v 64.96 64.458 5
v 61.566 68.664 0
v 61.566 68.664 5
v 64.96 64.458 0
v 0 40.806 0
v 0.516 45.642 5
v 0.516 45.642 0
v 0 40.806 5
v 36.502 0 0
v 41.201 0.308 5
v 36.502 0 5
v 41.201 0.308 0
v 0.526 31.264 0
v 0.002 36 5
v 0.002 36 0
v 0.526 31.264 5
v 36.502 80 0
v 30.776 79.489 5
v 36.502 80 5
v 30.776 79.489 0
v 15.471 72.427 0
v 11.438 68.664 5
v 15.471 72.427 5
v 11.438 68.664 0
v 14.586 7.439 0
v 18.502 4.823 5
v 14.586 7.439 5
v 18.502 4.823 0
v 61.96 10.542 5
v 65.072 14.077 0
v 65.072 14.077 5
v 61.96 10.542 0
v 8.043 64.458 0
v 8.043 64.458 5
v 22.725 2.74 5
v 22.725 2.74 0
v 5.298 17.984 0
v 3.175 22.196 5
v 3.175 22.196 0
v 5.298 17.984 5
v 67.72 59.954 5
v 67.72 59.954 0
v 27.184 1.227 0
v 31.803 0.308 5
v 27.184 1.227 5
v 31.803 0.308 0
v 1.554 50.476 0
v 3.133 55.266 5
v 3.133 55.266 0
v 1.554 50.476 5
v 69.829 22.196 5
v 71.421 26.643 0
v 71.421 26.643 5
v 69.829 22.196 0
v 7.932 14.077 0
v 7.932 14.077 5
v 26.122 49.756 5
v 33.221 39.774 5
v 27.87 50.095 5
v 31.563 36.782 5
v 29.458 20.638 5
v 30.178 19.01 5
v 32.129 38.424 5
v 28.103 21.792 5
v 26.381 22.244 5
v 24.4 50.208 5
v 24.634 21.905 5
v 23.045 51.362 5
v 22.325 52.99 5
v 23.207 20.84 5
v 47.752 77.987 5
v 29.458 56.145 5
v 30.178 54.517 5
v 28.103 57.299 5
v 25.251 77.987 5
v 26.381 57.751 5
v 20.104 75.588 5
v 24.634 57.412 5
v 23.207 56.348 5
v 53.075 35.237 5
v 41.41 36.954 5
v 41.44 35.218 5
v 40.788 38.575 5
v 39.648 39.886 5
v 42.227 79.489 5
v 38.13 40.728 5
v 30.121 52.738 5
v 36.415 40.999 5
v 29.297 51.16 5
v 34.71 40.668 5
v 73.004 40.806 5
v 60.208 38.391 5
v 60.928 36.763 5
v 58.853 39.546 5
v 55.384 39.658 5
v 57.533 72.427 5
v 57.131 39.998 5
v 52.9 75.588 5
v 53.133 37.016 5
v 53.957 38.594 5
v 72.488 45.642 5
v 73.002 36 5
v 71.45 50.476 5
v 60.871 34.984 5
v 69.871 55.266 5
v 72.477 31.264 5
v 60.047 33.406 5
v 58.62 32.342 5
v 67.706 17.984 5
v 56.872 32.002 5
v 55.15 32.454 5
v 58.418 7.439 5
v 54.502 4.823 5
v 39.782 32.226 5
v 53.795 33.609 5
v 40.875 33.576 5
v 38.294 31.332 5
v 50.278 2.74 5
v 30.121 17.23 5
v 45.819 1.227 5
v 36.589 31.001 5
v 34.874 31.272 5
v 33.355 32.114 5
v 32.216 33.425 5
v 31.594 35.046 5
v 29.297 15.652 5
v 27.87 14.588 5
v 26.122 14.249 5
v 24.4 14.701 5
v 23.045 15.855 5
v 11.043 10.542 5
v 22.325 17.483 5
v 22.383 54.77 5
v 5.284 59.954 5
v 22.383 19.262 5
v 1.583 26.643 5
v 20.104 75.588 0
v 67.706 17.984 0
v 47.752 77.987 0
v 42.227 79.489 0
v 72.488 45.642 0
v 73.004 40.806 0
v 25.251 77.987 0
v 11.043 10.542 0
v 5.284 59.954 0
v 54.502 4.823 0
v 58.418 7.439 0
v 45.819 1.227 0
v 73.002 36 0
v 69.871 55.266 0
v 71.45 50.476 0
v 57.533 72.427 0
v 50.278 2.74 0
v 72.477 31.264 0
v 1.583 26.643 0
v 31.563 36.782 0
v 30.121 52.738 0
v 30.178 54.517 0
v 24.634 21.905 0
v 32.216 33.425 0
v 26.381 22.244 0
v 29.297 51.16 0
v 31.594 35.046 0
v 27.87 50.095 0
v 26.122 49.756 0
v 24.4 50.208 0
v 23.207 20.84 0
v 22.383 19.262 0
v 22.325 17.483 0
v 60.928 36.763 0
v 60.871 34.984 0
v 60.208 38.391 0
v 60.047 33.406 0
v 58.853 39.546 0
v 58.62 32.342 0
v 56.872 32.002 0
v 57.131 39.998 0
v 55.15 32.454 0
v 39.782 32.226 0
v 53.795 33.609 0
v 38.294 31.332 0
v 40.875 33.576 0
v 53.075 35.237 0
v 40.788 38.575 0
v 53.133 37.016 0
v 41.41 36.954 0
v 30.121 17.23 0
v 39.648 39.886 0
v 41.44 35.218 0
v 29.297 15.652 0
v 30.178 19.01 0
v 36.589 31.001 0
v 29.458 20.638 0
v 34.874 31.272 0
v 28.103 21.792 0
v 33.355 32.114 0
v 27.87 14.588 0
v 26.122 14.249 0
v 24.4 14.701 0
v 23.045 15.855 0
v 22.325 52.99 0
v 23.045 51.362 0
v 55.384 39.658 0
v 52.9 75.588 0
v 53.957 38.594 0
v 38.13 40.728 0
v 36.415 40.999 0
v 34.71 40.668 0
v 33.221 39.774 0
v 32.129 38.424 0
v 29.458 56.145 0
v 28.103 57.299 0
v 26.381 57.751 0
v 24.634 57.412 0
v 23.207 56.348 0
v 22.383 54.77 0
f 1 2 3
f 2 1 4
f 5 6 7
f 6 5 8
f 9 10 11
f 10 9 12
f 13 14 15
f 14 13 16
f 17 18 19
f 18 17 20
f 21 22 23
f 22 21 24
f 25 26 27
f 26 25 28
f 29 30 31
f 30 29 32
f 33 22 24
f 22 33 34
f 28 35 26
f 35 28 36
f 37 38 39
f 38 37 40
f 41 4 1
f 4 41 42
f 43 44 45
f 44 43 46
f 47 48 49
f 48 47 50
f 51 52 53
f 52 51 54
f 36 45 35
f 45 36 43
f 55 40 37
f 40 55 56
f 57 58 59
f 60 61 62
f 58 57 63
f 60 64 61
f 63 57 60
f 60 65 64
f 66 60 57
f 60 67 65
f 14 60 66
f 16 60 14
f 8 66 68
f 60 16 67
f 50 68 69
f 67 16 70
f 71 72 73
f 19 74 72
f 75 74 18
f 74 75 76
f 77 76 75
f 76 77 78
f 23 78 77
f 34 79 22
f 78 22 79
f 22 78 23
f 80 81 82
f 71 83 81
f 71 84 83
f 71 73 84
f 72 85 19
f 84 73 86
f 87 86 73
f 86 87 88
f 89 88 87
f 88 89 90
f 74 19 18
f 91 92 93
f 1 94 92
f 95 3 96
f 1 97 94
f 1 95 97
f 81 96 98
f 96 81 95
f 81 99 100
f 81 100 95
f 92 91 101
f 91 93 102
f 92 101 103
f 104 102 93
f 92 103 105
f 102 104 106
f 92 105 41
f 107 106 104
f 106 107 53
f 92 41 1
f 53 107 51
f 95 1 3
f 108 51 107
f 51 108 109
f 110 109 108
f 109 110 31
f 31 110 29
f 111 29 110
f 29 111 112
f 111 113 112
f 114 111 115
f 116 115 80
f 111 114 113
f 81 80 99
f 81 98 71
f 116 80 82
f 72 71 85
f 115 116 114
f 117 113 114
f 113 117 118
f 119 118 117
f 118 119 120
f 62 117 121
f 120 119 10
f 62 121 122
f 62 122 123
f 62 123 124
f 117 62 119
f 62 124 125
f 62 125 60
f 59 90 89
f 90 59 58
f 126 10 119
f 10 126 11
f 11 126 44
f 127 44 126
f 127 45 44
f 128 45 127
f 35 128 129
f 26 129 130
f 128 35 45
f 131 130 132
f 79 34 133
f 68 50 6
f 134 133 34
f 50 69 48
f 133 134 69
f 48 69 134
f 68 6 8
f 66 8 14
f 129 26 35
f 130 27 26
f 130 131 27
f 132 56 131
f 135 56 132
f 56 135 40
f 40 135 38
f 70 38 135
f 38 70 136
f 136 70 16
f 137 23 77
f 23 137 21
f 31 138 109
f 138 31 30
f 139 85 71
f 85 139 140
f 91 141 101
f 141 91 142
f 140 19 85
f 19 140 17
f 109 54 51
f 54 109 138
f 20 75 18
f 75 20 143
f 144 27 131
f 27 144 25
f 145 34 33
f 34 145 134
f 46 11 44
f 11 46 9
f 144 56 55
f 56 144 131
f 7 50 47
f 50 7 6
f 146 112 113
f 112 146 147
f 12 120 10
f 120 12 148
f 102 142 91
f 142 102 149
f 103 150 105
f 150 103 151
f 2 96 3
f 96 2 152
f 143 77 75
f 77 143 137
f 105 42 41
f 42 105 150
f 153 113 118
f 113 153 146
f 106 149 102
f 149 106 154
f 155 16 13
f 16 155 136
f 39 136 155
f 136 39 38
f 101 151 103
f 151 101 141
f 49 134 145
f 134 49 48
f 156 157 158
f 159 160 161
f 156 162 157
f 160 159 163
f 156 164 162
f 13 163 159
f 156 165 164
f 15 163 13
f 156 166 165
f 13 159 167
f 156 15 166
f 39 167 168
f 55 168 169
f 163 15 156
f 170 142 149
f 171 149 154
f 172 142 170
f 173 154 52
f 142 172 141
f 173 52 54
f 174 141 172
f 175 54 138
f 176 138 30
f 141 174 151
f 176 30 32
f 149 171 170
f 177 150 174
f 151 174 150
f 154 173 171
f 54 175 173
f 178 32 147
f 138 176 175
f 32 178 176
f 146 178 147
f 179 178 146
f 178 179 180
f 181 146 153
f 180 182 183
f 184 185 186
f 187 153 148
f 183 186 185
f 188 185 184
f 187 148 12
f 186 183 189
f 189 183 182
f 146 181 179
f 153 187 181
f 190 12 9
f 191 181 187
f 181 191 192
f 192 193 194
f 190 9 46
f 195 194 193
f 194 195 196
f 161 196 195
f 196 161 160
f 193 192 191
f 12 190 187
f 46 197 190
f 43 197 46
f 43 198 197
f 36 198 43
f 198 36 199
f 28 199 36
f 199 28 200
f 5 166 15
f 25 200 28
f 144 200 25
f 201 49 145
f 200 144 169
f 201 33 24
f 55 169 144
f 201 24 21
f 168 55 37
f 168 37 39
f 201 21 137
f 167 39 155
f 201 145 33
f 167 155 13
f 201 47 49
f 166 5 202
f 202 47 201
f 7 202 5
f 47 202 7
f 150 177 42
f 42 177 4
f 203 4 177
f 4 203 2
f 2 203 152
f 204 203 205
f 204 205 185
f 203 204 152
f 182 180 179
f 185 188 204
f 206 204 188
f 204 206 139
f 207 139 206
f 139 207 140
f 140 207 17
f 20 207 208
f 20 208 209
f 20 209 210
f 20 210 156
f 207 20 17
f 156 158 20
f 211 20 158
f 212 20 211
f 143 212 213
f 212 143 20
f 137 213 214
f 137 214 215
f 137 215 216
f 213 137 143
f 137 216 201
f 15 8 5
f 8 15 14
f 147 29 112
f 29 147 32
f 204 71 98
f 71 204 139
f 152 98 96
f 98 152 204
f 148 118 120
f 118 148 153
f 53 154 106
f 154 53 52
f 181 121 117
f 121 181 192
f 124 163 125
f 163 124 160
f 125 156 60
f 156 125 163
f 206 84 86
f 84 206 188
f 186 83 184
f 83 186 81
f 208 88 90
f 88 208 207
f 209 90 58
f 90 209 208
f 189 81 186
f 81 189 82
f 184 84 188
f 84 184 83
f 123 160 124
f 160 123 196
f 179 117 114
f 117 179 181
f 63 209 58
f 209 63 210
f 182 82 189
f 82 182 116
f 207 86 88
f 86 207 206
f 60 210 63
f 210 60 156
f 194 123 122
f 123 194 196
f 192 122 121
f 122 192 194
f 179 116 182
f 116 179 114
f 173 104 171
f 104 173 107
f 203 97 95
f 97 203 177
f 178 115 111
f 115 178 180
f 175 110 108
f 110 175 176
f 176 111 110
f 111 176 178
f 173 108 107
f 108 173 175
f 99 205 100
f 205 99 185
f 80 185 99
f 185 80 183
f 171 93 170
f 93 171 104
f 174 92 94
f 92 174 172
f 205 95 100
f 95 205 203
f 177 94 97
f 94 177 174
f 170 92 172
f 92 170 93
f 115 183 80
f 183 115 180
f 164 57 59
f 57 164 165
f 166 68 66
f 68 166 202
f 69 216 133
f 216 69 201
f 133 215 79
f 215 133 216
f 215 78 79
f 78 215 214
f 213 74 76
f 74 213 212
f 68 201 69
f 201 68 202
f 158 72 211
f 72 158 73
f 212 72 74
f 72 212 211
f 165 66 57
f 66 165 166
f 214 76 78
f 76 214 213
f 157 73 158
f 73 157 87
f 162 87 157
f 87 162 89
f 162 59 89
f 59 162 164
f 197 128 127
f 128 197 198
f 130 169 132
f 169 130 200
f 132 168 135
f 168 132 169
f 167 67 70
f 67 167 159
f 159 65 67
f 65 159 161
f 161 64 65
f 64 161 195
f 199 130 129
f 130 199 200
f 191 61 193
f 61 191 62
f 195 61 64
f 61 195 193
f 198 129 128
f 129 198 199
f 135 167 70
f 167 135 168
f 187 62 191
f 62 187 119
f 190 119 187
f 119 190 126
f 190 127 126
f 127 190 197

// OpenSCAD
$fn = 32;

// ----------------------------------------------------------------------
// Cam plate: single_lobe cam, base R36
// ----------------------------------------------------------------------

// --- parameters (mm) ---
base_r = 36;              // base circle radius
lobe_h = 8;               // cam lobe rise
bore_r = 5;               // shaft bore radius
plate_t = 5;              // plate thickness, Z (extrusion height)
ring_r = 20.5;            // lightening ring radius
bolt_r = 4;               // lightening hole radius

profile = [[73.002, 36], [73.004, 40.806], [72.488, 45.642], [71.45, 50.476], [69.871, 55.266], [67.72, 59.954], [64.96, 64.458], [61.566, 68.664], [57.533, 72.427], [52.9, 75.588], [47.752, 77.987], [42.227, 79.489], [36.502, 80], [30.776, 79.489], [25.251, 77.987], [20.104, 75.588], [15.471, 72.427], [11.438, 68.664], [8.043, 64.458], [5.284, 59.954], [3.133, 55.266], [1.554, 50.476], [0.516, 45.642], [0, 40.806], [0.002, 36], [0.526, 31.264], [1.583, 26.643], [3.175, 22.196], [5.298, 17.984], [7.932, 14.077], [11.043, 10.542], [14.586, 7.439], [18.502, 4.823], [22.725, 2.74], [27.184, 1.227], [31.803, 0.308], [36.502, 0], [41.201, 0.308], [45.819, 1.227], [50.278, 2.74], [54.502, 4.823], [58.418, 7.439], [61.96, 10.542], [65.072, 14.077], [67.706, 17.984], [69.829, 22.196], [71.421, 26.643], [72.477, 31.264]];  // primary outline, 48 points, counter clockwise
void_1 = [[41.41, 36.954], [40.788, 38.575], [39.648, 39.886], [38.13, 40.728], [36.415, 40.999], [34.71, 40.668], [33.221, 39.774], [32.129, 38.424], [31.563, 36.782], [31.594, 35.046], [32.216, 33.425], [33.355, 32.114], [34.874, 31.272], [36.589, 31.001], [38.294, 31.332], [39.782, 32.226], [40.875, 33.576], [41.44, 35.218]];  // shaft bore, 18 points
void_2 = [[60.928, 36.763], [60.208, 38.391], [58.853, 39.546], [57.131, 39.998], [55.384, 39.658], [53.957, 38.594], [53.133, 37.016], [53.075, 35.237], [53.795, 33.609], [55.15, 32.454], [56.872, 32.002], [58.62, 32.342], [60.047, 33.406], [60.871, 34.984]];  // lightening hole 1, 14 points
void_3 = [[30.178, 54.517], [29.458, 56.145], [28.103, 57.299], [26.381, 57.751], [24.634, 57.412], [23.207, 56.348], [22.383, 54.77], [22.325, 52.99], [23.045, 51.362], [24.4, 50.208], [26.122, 49.756], [27.87, 50.095], [29.297, 51.16], [30.121, 52.738]];  // lightening hole 2, 14 points
void_4 = [[30.178, 19.01], [29.458, 20.638], [28.103, 21.792], [26.381, 22.244], [24.634, 21.905], [23.207, 20.84], [22.383, 19.262], [22.325, 17.483], [23.045, 15.855], [24.4, 14.701], [26.122, 14.249], [27.87, 14.588], [29.297, 15.652], [30.121, 17.23]];  // lightening hole 3, 14 points

// --- the one profile operation ---
difference() {
  linear_extrude(height = plate_t) polygon(points = profile);
  translate([0, 0, -1])
    linear_extrude(height = plate_t + 2) polygon(points = void_1);
  translate([0, 0, -1])
    linear_extrude(height = plate_t + 2) polygon(points = void_2);
  translate([0, 0, -1])
    linear_extrude(height = plate_t + 2) polygon(points = void_3);
  translate([0, 0, -1])
    linear_extrude(height = plate_t + 2) polygon(points = void_4);
}
